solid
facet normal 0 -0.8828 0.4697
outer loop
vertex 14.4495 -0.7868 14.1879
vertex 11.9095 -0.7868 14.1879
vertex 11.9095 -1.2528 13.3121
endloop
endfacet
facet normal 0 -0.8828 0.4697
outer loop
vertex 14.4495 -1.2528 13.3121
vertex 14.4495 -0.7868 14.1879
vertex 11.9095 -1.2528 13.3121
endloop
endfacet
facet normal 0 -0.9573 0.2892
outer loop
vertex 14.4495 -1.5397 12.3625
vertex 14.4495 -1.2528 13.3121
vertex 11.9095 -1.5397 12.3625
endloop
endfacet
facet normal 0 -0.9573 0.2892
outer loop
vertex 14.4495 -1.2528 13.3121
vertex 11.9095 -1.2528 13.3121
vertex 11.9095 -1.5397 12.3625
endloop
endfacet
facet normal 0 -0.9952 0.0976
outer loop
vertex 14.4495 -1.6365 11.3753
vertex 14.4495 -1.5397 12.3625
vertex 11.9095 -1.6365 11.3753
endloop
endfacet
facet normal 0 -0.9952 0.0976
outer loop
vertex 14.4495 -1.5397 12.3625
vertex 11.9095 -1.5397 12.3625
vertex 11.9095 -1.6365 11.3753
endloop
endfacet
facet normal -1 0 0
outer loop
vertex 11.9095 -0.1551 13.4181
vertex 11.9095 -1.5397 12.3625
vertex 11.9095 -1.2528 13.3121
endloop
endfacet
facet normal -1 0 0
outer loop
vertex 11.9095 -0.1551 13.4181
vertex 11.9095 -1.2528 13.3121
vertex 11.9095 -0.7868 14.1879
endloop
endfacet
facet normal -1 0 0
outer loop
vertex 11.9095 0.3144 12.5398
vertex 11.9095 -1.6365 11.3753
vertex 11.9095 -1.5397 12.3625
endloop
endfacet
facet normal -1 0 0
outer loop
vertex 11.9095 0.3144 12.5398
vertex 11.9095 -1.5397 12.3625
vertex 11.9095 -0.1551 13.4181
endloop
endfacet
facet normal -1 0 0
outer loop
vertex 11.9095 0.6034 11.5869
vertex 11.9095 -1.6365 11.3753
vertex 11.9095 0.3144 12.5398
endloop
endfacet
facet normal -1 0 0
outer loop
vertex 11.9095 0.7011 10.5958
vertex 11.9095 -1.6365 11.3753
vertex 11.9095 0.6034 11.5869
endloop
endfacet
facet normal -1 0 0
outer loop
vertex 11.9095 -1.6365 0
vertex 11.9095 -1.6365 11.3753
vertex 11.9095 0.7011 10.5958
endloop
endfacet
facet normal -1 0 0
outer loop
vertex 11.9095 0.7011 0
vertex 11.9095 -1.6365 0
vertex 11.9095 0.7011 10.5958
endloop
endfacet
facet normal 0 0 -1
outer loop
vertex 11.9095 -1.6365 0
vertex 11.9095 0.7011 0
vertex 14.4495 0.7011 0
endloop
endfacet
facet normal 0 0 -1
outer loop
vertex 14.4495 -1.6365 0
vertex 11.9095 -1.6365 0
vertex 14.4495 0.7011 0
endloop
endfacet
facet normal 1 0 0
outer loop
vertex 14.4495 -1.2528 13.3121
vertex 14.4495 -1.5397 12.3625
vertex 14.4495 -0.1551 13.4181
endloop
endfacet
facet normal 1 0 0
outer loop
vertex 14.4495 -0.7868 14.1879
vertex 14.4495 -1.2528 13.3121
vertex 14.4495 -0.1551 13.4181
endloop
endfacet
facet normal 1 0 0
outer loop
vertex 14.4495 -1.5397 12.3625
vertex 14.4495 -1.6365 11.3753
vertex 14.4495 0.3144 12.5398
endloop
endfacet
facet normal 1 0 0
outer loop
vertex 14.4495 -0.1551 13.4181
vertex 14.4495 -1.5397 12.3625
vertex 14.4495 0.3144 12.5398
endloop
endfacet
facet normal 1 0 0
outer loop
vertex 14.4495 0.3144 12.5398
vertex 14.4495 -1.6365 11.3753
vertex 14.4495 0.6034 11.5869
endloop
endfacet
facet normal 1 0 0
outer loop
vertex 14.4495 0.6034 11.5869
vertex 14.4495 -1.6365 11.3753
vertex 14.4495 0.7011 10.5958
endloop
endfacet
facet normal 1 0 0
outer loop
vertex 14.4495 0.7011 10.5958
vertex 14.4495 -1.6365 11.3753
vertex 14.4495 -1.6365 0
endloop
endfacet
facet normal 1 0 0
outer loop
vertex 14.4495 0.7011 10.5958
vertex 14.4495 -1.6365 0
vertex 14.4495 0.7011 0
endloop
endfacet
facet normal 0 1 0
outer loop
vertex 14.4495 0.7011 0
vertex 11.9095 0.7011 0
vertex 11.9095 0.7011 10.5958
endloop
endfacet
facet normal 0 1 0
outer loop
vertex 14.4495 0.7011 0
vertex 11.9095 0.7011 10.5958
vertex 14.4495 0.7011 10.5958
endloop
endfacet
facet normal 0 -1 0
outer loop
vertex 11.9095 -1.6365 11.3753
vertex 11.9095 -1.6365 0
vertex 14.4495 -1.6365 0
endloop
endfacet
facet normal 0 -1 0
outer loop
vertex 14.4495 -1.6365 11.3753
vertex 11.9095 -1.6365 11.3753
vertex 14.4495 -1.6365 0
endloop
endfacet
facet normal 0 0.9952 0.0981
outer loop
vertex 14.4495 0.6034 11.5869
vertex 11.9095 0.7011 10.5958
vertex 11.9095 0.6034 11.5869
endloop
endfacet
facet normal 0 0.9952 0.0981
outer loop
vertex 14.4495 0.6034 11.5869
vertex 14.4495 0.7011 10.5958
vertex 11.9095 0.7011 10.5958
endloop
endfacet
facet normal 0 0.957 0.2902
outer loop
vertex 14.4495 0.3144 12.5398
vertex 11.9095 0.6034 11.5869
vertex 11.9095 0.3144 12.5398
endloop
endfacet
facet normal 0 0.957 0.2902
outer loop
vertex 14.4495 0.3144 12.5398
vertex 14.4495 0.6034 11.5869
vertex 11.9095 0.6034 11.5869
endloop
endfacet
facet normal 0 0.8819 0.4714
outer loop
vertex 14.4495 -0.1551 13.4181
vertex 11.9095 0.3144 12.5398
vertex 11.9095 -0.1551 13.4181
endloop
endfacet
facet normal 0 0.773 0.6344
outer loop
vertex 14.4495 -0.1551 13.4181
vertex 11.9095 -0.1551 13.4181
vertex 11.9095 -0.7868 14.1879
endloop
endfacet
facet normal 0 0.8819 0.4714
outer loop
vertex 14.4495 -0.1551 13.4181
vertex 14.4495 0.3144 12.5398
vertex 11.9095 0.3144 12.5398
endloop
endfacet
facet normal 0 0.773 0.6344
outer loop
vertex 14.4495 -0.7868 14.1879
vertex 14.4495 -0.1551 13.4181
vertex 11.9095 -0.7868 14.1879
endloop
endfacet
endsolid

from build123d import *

# Parameters (mm, degrees)
F0_W        = 2.54
F0_H        = 2.3375834556
F1_DEPTH    = 25.4
F2_T1_DEPTH = 67.8607478943
F3_R        = 5.08
F4_T1_DEPTH = 20.8515396399


# Not quite as in the source:
# - a fillet or chamfer that OpenCascade refuses, or shapes differently, is made with other operations: its cross-section is extruded or revolved along the edge and cut away or added


with BuildPart() as f1:
    # F0 (on Top) → F1 (new body)
    with BuildSketch(Plane.XY):
        with Locations((13.1794903427, -0.4677381366)):
            Rectangle(F0_W, F0_H)
    extrude(amount=F1_DEPTH)

    # F2: chamfer of 12.7 on 1 edges, made by hand

    # F2_s2 → F2_t1 (cut)
    with BuildSketch(Plane.YZ.offset(-20.7508836044)):
        Polygon((0.7010535912, 12.7), (-11.9989464088, 25.4), (0.7010535912, 25.4), align=None)
    extrude(amount=F2_T1_DEPTH, mode=Mode.SUBTRACT)

    # F3
    f3_edges = [f1.edges().sort_by_distance(p)[0] for p in [
        (13.17949, 0.701054, 12.7),
    ]]
    fillet(f3_edges, radius=F3_R)

    # F4: fillet of radius 5.08 on 1 edges, made by hand

    # F4_s2 → F4_t1 (cut)
    with BuildSketch(Plane.YZ.offset(2.7537205228)):
        with BuildLine():
            ThreePointArc((-0.7868439604, 14.1878975516), (-1.4194711353, 12.8443576208), (-1.6365298645, 11.3752755277))
            Line((-1.6365298645, 11.3752755277), (-1.6365298645, 15.0375834557))
            Line((-1.6365298645, 15.0375834557), (-0.7868439604, 14.1878975516))
        make_face()
    extrude(amount=F4_T1_DEPTH, mode=Mode.SUBTRACT)


solid = f1.part
